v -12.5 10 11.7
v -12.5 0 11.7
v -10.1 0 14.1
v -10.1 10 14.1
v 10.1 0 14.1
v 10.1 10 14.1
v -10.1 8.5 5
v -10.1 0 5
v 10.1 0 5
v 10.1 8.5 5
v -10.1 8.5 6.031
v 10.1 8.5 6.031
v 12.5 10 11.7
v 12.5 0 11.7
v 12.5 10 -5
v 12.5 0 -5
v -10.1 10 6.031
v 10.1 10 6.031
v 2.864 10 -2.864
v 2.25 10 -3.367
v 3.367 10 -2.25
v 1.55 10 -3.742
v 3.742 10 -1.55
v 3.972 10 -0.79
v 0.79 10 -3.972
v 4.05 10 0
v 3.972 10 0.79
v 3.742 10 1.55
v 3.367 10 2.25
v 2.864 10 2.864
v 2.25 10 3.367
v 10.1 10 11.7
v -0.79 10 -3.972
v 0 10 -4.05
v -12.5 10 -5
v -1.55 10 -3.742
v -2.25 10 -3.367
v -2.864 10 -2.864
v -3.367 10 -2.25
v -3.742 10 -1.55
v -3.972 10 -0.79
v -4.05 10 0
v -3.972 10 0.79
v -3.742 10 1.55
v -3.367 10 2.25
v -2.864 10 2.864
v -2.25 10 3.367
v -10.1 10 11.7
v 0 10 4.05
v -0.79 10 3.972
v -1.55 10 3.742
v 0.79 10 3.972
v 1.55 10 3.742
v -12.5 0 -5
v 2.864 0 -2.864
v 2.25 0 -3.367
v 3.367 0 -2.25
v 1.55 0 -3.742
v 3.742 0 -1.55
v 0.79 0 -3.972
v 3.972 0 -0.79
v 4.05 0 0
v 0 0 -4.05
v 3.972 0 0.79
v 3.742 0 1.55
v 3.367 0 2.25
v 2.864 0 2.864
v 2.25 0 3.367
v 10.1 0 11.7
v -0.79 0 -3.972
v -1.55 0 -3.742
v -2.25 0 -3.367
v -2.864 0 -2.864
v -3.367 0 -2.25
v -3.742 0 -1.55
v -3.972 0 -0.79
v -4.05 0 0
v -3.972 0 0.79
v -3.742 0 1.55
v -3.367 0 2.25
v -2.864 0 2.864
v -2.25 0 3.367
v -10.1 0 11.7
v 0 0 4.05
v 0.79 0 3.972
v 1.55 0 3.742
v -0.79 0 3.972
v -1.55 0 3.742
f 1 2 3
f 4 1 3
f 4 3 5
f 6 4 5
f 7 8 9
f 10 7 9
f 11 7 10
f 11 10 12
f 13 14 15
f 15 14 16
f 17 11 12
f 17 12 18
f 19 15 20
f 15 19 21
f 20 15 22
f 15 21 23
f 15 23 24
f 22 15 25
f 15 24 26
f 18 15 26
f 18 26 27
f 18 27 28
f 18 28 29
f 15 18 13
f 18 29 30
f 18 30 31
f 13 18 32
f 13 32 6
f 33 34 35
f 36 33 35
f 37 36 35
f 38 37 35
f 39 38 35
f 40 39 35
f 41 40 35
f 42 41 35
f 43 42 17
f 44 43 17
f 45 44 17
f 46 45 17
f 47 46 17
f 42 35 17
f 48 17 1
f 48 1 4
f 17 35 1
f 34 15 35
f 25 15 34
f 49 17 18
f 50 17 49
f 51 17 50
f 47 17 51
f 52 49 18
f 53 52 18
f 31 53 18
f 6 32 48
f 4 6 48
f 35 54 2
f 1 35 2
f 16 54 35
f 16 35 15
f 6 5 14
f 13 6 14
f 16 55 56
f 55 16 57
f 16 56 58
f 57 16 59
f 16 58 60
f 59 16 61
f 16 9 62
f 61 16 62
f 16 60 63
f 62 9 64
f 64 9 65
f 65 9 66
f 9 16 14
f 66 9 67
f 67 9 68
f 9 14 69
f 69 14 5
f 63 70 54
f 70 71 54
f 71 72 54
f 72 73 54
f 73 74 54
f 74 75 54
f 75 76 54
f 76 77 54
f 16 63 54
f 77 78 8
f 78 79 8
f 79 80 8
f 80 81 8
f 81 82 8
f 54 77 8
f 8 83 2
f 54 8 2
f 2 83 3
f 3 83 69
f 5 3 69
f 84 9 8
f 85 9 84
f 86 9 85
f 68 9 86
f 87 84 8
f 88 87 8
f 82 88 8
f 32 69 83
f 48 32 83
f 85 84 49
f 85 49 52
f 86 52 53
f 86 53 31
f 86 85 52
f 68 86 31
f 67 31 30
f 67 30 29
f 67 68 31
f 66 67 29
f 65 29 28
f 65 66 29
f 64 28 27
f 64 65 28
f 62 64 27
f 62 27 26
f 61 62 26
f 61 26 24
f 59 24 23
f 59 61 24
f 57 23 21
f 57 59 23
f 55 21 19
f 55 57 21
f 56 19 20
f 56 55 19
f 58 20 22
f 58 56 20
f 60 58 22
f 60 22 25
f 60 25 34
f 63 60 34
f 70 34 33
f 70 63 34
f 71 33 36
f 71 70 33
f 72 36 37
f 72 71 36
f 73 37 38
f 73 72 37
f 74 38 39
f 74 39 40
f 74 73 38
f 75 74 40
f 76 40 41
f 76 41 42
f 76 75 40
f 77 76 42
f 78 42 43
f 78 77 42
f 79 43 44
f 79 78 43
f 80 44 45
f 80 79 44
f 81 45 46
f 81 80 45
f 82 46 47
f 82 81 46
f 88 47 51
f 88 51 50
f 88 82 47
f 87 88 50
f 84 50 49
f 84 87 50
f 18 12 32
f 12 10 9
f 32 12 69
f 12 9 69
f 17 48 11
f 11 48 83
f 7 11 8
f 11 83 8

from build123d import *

# Parameters (mm, degrees)
ESBO_O1_W                = 25
ESBO_O1_H                = 10
ESBO_O1_R                = 4.05
RESSALTO_EXTRUS_O1_DEPTH = 10
RESSALTO_EXTRUS_O2_DEPTH = 10
RESSALTO_EXTRUS_O3_REACH = 32.394
ESBO_O3_W                = 1.752399307
ESBO_O3_H                = 1.5


with BuildPart() as part:
    # Esboço1 → Ressalto-extrusão1 (new body)
    with BuildSketch(Plane(origin=(0, 0, 0), x_dir=(1, 0, 0), z_dir=(0, 1, 0))):
        Rectangle(ESBO_O1_W, ESBO_O1_H)
        with Locations(Location((0, 0, 0), (0, 0, 270))):
            Circle(ESBO_O1_R, mode=Mode.SUBTRACT)
    extrude(amount=RESSALTO_EXTRUS_O1_DEPTH)

    # Esboço2 → Ressalto-extrusão2 (add)
    with BuildSketch(Plane.XZ):
        Polygon((-12.5, 5), (-12.5, 11.7), (-10.1, 14.1), (10.1, 14.1), (12.5, 11.7), (12.5, 5), (10.1, 5), (10.1, 11.7), (-10.1, 11.7), (-10.1, 5), align=None)
    extrude(amount=-RESSALTO_EXTRUS_O2_DEPTH)

    # Esboço3 → Ressalto-extrusão3 (add, up to next)
    with BuildSketch(Plane.ZY.offset(12.5), mode=Mode.PRIVATE) as ressalto_extrus_o3_sk1:
        with Locations((5.154994999, 9.25)):
            Rectangle(ESBO_O3_W, ESBO_O3_H)
    ressalto_extrus_o3_tool1 = extrude(ressalto_extrus_o3_sk1.sketch, amount=-RESSALTO_EXTRUS_O3_REACH, mode=Mode.PRIVATE) - part.part
    add(ressalto_extrus_o3_tool1.solids().sort_by_distance((-12.5, 9.25, 5.154995))[0])


solid = part.part
